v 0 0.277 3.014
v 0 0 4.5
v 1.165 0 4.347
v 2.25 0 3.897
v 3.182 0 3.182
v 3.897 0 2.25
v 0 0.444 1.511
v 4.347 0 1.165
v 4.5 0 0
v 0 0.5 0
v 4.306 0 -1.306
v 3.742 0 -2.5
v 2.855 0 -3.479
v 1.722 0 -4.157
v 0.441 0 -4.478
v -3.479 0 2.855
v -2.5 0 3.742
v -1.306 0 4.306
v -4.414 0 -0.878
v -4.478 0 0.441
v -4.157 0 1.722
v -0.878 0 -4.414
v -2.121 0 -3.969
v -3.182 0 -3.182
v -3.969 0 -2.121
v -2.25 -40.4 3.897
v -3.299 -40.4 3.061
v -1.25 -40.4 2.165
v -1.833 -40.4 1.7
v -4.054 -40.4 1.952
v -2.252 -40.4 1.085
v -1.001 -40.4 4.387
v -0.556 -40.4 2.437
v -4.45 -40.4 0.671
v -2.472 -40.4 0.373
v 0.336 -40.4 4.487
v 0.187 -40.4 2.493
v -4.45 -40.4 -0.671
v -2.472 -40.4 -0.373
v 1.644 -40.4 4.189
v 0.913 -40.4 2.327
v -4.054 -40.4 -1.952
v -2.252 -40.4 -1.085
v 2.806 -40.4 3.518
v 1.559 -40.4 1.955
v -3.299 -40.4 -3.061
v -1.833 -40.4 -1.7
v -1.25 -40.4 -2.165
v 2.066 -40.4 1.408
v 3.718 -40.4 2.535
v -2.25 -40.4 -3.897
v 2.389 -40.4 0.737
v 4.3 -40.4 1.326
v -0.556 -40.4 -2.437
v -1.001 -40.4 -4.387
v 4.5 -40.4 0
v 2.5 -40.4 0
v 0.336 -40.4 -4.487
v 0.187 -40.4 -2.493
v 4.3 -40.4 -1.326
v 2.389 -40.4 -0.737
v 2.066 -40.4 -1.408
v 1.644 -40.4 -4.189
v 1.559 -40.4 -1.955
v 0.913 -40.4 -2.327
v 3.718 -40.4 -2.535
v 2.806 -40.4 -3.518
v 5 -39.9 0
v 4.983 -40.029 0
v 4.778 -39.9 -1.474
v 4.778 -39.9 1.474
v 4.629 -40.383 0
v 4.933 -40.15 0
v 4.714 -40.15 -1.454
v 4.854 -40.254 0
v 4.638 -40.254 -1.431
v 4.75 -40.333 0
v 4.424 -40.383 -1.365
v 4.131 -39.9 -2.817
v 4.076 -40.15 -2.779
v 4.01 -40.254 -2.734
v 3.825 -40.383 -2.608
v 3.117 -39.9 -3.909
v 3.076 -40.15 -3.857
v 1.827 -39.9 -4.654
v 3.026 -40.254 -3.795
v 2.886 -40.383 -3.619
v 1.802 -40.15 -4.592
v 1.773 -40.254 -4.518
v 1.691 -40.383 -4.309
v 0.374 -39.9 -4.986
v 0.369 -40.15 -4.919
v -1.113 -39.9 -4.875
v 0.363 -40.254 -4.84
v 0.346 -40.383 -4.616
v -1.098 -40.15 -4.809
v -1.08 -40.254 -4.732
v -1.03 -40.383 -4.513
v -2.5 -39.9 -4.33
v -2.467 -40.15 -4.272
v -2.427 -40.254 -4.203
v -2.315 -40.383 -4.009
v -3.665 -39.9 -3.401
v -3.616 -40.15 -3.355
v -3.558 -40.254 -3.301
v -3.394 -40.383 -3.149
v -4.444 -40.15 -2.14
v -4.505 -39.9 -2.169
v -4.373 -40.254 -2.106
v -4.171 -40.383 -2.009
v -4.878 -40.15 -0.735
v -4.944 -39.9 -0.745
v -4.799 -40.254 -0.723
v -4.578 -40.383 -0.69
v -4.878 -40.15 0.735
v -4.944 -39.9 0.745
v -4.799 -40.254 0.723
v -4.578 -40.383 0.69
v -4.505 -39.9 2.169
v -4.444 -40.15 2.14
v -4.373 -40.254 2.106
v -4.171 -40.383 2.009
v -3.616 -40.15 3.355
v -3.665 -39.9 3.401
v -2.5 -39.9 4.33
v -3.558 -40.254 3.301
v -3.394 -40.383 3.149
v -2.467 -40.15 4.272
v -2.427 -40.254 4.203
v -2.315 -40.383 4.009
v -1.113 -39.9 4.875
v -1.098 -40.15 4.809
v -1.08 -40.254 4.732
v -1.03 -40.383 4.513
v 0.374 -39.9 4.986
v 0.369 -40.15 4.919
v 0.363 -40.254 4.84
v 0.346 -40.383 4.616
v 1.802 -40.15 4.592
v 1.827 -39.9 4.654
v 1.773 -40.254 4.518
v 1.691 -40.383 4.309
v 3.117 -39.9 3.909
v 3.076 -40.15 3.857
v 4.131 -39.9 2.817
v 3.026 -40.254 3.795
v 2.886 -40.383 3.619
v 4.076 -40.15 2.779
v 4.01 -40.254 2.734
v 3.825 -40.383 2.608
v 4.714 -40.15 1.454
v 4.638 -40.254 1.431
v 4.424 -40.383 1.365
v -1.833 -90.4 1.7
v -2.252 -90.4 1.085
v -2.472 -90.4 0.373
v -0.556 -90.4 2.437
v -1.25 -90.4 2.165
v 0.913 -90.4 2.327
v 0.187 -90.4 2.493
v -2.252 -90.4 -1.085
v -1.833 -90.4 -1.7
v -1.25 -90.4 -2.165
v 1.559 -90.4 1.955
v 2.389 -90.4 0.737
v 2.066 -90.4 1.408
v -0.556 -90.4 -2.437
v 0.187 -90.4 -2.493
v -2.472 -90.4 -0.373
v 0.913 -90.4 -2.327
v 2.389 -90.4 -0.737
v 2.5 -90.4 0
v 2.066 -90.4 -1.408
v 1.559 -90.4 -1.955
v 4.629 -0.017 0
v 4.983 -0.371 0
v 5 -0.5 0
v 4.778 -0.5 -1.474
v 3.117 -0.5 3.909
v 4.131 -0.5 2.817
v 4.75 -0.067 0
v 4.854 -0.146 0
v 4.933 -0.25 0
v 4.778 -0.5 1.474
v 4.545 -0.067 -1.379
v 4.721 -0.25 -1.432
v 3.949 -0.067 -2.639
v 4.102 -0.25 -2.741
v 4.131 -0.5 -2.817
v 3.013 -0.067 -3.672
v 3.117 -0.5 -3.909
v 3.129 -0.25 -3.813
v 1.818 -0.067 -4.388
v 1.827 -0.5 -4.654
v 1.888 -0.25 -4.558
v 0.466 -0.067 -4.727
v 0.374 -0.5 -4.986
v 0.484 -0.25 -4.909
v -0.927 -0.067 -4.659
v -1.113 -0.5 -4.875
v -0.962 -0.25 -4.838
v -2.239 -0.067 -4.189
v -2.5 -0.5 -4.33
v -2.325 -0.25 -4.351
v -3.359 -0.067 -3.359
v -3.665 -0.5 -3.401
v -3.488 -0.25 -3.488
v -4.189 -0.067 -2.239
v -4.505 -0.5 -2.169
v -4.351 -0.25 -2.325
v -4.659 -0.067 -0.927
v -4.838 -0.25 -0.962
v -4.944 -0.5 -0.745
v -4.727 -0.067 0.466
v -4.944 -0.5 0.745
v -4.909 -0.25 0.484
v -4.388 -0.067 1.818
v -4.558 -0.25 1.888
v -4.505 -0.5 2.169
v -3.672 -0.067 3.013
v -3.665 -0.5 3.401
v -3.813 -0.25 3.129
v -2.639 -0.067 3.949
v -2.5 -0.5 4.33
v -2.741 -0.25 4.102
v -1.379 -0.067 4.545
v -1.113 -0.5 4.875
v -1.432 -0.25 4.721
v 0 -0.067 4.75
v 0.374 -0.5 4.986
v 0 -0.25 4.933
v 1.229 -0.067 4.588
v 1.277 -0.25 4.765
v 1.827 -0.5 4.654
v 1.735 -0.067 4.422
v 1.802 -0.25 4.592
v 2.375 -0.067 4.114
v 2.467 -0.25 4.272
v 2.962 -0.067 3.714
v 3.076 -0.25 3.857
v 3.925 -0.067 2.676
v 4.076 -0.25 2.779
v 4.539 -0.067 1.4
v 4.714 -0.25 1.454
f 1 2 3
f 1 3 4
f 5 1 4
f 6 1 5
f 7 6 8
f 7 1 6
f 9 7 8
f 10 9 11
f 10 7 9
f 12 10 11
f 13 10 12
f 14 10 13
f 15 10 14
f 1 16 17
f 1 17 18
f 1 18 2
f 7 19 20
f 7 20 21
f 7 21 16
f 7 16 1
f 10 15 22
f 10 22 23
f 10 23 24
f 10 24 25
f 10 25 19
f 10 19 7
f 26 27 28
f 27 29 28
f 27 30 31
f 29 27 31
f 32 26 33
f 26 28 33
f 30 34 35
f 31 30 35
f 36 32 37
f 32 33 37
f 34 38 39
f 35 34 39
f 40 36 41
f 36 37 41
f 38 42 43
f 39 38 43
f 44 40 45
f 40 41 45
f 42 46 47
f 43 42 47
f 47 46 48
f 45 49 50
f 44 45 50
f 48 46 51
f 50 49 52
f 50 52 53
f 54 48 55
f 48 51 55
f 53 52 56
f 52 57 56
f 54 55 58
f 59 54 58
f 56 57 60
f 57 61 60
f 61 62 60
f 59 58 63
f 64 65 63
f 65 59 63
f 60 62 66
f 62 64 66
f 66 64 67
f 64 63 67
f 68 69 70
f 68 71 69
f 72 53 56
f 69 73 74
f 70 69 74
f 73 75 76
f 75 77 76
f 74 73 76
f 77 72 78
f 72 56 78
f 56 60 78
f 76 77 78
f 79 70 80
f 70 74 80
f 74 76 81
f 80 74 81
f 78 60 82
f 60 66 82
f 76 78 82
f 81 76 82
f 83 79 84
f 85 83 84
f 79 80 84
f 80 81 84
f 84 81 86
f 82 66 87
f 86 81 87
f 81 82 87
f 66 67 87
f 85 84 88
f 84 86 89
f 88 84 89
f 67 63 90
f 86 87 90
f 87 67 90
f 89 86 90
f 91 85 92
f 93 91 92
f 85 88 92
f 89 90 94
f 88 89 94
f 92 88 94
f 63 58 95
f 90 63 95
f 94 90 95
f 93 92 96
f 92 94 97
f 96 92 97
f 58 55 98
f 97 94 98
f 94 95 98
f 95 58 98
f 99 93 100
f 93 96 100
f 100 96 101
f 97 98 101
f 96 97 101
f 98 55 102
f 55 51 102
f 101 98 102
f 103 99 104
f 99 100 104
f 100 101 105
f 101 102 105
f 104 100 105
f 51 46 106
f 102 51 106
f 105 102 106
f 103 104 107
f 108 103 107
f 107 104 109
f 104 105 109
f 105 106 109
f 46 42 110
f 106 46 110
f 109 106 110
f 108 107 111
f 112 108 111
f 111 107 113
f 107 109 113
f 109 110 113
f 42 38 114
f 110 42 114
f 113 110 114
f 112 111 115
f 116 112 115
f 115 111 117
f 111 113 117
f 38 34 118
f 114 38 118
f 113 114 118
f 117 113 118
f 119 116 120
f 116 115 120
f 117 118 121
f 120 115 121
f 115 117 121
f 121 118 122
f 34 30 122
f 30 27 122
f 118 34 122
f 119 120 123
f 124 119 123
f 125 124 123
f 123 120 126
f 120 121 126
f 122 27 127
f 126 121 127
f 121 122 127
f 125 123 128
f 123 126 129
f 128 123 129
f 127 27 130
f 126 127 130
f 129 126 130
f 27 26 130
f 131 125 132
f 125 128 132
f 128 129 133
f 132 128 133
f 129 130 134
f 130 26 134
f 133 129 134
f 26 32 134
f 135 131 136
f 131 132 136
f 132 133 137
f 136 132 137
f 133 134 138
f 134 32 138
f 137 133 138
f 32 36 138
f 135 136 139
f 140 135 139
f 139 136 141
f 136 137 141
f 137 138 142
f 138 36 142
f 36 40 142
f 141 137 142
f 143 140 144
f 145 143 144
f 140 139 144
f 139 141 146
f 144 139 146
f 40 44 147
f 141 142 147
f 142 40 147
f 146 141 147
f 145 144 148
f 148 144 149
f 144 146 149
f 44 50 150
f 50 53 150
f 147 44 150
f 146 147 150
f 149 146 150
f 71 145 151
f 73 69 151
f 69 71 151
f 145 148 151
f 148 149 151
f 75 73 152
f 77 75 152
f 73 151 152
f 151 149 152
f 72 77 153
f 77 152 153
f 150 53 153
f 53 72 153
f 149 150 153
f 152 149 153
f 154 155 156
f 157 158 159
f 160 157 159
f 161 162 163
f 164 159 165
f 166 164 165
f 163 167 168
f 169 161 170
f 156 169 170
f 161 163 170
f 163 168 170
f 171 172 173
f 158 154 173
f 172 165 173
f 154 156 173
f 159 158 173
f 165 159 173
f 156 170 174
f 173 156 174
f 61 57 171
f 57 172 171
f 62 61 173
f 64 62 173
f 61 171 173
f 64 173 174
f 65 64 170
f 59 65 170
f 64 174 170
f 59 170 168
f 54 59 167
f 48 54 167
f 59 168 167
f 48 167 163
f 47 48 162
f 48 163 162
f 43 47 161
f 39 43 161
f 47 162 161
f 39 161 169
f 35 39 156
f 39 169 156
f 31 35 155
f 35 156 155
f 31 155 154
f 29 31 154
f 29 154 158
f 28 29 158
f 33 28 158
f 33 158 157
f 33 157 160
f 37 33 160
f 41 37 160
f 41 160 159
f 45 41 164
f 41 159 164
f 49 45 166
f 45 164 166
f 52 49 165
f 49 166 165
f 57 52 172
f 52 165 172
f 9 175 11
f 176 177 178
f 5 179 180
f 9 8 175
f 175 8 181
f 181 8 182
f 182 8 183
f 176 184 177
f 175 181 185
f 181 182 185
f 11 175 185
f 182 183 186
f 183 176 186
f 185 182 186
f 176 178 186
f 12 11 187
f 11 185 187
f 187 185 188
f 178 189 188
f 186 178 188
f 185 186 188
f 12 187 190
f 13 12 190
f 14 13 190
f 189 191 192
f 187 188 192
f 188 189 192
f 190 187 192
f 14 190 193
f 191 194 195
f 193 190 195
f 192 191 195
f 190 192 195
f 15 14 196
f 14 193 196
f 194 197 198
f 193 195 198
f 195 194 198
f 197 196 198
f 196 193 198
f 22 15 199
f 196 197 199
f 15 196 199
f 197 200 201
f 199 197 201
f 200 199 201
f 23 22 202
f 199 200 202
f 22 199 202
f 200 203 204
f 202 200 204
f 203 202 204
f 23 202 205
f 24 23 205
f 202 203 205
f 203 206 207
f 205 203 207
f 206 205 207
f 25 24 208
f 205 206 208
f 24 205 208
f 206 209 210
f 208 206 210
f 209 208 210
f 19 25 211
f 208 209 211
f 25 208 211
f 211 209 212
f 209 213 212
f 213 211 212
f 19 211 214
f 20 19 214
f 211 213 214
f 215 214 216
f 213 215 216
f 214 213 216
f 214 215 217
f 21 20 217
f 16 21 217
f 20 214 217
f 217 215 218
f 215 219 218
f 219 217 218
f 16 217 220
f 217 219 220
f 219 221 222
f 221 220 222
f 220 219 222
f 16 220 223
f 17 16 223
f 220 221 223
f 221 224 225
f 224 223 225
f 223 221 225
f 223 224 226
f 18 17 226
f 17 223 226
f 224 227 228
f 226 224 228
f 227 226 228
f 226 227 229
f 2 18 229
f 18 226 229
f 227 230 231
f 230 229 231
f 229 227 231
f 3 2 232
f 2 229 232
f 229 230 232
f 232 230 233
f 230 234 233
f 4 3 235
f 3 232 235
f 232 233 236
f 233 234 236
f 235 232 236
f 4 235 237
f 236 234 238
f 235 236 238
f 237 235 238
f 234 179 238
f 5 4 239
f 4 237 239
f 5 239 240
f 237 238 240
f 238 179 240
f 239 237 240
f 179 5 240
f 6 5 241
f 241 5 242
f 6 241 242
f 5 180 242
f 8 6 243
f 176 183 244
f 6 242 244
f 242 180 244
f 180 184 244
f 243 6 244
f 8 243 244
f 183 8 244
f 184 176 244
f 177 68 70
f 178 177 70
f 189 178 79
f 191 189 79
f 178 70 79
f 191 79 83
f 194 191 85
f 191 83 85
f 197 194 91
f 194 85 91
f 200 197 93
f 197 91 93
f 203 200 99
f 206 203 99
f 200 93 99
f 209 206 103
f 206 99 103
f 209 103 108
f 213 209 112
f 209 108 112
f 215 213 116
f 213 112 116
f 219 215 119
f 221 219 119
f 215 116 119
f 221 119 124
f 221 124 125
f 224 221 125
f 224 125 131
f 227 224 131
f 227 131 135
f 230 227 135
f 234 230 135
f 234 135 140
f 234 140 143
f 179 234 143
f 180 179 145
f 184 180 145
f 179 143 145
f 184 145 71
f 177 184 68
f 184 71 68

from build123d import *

# Parameters (mm, degrees)
FILLET1_R         = 0.5
DOME1_FACE_RADIUS = 4.5
DOME1_HEIGHT      = 0.5


with BuildPart() as part:
    # Sketch1 → Revolve1 (revolve)
    with BuildSketch(Plane.XY):
        Polygon((0, 0), (5, 0), (5, -40.4), (2.5, -40.4), (2.5, -90.4), (0, -90.4), align=None)
    revolve(axis=Axis((0, -90.4, 0), (0, 1, 0)))

    # Fillet1
    fillet1_edges = [part.edges().sort_by_distance(p)[0] for p in [
        (-5, -40.4, 0),
        (-5, 0, 0),
    ]]
    fillet(fillet1_edges, radius=FILLET1_R)

    # Dome1: a dome of height H over a round flat face of radius A is a cap of a sphere of radius (A * A + H * H) / (2 * H)
    dome1_r = (DOME1_FACE_RADIUS * DOME1_FACE_RADIUS + DOME1_HEIGHT * DOME1_HEIGHT) / (2 * DOME1_HEIGHT)
    dome1_base = Plane((0, 0, 0), z_dir=(0, 1, 0))
    with Locations(dome1_base.offset(DOME1_HEIGHT - dome1_r)):
        dome1_ball = Sphere(dome1_r, mode=Mode.PRIVATE)
    add(split(dome1_ball, bisect_by=dome1_base, keep=Keep.TOP, mode=Mode.PRIVATE))


solid = part.part
